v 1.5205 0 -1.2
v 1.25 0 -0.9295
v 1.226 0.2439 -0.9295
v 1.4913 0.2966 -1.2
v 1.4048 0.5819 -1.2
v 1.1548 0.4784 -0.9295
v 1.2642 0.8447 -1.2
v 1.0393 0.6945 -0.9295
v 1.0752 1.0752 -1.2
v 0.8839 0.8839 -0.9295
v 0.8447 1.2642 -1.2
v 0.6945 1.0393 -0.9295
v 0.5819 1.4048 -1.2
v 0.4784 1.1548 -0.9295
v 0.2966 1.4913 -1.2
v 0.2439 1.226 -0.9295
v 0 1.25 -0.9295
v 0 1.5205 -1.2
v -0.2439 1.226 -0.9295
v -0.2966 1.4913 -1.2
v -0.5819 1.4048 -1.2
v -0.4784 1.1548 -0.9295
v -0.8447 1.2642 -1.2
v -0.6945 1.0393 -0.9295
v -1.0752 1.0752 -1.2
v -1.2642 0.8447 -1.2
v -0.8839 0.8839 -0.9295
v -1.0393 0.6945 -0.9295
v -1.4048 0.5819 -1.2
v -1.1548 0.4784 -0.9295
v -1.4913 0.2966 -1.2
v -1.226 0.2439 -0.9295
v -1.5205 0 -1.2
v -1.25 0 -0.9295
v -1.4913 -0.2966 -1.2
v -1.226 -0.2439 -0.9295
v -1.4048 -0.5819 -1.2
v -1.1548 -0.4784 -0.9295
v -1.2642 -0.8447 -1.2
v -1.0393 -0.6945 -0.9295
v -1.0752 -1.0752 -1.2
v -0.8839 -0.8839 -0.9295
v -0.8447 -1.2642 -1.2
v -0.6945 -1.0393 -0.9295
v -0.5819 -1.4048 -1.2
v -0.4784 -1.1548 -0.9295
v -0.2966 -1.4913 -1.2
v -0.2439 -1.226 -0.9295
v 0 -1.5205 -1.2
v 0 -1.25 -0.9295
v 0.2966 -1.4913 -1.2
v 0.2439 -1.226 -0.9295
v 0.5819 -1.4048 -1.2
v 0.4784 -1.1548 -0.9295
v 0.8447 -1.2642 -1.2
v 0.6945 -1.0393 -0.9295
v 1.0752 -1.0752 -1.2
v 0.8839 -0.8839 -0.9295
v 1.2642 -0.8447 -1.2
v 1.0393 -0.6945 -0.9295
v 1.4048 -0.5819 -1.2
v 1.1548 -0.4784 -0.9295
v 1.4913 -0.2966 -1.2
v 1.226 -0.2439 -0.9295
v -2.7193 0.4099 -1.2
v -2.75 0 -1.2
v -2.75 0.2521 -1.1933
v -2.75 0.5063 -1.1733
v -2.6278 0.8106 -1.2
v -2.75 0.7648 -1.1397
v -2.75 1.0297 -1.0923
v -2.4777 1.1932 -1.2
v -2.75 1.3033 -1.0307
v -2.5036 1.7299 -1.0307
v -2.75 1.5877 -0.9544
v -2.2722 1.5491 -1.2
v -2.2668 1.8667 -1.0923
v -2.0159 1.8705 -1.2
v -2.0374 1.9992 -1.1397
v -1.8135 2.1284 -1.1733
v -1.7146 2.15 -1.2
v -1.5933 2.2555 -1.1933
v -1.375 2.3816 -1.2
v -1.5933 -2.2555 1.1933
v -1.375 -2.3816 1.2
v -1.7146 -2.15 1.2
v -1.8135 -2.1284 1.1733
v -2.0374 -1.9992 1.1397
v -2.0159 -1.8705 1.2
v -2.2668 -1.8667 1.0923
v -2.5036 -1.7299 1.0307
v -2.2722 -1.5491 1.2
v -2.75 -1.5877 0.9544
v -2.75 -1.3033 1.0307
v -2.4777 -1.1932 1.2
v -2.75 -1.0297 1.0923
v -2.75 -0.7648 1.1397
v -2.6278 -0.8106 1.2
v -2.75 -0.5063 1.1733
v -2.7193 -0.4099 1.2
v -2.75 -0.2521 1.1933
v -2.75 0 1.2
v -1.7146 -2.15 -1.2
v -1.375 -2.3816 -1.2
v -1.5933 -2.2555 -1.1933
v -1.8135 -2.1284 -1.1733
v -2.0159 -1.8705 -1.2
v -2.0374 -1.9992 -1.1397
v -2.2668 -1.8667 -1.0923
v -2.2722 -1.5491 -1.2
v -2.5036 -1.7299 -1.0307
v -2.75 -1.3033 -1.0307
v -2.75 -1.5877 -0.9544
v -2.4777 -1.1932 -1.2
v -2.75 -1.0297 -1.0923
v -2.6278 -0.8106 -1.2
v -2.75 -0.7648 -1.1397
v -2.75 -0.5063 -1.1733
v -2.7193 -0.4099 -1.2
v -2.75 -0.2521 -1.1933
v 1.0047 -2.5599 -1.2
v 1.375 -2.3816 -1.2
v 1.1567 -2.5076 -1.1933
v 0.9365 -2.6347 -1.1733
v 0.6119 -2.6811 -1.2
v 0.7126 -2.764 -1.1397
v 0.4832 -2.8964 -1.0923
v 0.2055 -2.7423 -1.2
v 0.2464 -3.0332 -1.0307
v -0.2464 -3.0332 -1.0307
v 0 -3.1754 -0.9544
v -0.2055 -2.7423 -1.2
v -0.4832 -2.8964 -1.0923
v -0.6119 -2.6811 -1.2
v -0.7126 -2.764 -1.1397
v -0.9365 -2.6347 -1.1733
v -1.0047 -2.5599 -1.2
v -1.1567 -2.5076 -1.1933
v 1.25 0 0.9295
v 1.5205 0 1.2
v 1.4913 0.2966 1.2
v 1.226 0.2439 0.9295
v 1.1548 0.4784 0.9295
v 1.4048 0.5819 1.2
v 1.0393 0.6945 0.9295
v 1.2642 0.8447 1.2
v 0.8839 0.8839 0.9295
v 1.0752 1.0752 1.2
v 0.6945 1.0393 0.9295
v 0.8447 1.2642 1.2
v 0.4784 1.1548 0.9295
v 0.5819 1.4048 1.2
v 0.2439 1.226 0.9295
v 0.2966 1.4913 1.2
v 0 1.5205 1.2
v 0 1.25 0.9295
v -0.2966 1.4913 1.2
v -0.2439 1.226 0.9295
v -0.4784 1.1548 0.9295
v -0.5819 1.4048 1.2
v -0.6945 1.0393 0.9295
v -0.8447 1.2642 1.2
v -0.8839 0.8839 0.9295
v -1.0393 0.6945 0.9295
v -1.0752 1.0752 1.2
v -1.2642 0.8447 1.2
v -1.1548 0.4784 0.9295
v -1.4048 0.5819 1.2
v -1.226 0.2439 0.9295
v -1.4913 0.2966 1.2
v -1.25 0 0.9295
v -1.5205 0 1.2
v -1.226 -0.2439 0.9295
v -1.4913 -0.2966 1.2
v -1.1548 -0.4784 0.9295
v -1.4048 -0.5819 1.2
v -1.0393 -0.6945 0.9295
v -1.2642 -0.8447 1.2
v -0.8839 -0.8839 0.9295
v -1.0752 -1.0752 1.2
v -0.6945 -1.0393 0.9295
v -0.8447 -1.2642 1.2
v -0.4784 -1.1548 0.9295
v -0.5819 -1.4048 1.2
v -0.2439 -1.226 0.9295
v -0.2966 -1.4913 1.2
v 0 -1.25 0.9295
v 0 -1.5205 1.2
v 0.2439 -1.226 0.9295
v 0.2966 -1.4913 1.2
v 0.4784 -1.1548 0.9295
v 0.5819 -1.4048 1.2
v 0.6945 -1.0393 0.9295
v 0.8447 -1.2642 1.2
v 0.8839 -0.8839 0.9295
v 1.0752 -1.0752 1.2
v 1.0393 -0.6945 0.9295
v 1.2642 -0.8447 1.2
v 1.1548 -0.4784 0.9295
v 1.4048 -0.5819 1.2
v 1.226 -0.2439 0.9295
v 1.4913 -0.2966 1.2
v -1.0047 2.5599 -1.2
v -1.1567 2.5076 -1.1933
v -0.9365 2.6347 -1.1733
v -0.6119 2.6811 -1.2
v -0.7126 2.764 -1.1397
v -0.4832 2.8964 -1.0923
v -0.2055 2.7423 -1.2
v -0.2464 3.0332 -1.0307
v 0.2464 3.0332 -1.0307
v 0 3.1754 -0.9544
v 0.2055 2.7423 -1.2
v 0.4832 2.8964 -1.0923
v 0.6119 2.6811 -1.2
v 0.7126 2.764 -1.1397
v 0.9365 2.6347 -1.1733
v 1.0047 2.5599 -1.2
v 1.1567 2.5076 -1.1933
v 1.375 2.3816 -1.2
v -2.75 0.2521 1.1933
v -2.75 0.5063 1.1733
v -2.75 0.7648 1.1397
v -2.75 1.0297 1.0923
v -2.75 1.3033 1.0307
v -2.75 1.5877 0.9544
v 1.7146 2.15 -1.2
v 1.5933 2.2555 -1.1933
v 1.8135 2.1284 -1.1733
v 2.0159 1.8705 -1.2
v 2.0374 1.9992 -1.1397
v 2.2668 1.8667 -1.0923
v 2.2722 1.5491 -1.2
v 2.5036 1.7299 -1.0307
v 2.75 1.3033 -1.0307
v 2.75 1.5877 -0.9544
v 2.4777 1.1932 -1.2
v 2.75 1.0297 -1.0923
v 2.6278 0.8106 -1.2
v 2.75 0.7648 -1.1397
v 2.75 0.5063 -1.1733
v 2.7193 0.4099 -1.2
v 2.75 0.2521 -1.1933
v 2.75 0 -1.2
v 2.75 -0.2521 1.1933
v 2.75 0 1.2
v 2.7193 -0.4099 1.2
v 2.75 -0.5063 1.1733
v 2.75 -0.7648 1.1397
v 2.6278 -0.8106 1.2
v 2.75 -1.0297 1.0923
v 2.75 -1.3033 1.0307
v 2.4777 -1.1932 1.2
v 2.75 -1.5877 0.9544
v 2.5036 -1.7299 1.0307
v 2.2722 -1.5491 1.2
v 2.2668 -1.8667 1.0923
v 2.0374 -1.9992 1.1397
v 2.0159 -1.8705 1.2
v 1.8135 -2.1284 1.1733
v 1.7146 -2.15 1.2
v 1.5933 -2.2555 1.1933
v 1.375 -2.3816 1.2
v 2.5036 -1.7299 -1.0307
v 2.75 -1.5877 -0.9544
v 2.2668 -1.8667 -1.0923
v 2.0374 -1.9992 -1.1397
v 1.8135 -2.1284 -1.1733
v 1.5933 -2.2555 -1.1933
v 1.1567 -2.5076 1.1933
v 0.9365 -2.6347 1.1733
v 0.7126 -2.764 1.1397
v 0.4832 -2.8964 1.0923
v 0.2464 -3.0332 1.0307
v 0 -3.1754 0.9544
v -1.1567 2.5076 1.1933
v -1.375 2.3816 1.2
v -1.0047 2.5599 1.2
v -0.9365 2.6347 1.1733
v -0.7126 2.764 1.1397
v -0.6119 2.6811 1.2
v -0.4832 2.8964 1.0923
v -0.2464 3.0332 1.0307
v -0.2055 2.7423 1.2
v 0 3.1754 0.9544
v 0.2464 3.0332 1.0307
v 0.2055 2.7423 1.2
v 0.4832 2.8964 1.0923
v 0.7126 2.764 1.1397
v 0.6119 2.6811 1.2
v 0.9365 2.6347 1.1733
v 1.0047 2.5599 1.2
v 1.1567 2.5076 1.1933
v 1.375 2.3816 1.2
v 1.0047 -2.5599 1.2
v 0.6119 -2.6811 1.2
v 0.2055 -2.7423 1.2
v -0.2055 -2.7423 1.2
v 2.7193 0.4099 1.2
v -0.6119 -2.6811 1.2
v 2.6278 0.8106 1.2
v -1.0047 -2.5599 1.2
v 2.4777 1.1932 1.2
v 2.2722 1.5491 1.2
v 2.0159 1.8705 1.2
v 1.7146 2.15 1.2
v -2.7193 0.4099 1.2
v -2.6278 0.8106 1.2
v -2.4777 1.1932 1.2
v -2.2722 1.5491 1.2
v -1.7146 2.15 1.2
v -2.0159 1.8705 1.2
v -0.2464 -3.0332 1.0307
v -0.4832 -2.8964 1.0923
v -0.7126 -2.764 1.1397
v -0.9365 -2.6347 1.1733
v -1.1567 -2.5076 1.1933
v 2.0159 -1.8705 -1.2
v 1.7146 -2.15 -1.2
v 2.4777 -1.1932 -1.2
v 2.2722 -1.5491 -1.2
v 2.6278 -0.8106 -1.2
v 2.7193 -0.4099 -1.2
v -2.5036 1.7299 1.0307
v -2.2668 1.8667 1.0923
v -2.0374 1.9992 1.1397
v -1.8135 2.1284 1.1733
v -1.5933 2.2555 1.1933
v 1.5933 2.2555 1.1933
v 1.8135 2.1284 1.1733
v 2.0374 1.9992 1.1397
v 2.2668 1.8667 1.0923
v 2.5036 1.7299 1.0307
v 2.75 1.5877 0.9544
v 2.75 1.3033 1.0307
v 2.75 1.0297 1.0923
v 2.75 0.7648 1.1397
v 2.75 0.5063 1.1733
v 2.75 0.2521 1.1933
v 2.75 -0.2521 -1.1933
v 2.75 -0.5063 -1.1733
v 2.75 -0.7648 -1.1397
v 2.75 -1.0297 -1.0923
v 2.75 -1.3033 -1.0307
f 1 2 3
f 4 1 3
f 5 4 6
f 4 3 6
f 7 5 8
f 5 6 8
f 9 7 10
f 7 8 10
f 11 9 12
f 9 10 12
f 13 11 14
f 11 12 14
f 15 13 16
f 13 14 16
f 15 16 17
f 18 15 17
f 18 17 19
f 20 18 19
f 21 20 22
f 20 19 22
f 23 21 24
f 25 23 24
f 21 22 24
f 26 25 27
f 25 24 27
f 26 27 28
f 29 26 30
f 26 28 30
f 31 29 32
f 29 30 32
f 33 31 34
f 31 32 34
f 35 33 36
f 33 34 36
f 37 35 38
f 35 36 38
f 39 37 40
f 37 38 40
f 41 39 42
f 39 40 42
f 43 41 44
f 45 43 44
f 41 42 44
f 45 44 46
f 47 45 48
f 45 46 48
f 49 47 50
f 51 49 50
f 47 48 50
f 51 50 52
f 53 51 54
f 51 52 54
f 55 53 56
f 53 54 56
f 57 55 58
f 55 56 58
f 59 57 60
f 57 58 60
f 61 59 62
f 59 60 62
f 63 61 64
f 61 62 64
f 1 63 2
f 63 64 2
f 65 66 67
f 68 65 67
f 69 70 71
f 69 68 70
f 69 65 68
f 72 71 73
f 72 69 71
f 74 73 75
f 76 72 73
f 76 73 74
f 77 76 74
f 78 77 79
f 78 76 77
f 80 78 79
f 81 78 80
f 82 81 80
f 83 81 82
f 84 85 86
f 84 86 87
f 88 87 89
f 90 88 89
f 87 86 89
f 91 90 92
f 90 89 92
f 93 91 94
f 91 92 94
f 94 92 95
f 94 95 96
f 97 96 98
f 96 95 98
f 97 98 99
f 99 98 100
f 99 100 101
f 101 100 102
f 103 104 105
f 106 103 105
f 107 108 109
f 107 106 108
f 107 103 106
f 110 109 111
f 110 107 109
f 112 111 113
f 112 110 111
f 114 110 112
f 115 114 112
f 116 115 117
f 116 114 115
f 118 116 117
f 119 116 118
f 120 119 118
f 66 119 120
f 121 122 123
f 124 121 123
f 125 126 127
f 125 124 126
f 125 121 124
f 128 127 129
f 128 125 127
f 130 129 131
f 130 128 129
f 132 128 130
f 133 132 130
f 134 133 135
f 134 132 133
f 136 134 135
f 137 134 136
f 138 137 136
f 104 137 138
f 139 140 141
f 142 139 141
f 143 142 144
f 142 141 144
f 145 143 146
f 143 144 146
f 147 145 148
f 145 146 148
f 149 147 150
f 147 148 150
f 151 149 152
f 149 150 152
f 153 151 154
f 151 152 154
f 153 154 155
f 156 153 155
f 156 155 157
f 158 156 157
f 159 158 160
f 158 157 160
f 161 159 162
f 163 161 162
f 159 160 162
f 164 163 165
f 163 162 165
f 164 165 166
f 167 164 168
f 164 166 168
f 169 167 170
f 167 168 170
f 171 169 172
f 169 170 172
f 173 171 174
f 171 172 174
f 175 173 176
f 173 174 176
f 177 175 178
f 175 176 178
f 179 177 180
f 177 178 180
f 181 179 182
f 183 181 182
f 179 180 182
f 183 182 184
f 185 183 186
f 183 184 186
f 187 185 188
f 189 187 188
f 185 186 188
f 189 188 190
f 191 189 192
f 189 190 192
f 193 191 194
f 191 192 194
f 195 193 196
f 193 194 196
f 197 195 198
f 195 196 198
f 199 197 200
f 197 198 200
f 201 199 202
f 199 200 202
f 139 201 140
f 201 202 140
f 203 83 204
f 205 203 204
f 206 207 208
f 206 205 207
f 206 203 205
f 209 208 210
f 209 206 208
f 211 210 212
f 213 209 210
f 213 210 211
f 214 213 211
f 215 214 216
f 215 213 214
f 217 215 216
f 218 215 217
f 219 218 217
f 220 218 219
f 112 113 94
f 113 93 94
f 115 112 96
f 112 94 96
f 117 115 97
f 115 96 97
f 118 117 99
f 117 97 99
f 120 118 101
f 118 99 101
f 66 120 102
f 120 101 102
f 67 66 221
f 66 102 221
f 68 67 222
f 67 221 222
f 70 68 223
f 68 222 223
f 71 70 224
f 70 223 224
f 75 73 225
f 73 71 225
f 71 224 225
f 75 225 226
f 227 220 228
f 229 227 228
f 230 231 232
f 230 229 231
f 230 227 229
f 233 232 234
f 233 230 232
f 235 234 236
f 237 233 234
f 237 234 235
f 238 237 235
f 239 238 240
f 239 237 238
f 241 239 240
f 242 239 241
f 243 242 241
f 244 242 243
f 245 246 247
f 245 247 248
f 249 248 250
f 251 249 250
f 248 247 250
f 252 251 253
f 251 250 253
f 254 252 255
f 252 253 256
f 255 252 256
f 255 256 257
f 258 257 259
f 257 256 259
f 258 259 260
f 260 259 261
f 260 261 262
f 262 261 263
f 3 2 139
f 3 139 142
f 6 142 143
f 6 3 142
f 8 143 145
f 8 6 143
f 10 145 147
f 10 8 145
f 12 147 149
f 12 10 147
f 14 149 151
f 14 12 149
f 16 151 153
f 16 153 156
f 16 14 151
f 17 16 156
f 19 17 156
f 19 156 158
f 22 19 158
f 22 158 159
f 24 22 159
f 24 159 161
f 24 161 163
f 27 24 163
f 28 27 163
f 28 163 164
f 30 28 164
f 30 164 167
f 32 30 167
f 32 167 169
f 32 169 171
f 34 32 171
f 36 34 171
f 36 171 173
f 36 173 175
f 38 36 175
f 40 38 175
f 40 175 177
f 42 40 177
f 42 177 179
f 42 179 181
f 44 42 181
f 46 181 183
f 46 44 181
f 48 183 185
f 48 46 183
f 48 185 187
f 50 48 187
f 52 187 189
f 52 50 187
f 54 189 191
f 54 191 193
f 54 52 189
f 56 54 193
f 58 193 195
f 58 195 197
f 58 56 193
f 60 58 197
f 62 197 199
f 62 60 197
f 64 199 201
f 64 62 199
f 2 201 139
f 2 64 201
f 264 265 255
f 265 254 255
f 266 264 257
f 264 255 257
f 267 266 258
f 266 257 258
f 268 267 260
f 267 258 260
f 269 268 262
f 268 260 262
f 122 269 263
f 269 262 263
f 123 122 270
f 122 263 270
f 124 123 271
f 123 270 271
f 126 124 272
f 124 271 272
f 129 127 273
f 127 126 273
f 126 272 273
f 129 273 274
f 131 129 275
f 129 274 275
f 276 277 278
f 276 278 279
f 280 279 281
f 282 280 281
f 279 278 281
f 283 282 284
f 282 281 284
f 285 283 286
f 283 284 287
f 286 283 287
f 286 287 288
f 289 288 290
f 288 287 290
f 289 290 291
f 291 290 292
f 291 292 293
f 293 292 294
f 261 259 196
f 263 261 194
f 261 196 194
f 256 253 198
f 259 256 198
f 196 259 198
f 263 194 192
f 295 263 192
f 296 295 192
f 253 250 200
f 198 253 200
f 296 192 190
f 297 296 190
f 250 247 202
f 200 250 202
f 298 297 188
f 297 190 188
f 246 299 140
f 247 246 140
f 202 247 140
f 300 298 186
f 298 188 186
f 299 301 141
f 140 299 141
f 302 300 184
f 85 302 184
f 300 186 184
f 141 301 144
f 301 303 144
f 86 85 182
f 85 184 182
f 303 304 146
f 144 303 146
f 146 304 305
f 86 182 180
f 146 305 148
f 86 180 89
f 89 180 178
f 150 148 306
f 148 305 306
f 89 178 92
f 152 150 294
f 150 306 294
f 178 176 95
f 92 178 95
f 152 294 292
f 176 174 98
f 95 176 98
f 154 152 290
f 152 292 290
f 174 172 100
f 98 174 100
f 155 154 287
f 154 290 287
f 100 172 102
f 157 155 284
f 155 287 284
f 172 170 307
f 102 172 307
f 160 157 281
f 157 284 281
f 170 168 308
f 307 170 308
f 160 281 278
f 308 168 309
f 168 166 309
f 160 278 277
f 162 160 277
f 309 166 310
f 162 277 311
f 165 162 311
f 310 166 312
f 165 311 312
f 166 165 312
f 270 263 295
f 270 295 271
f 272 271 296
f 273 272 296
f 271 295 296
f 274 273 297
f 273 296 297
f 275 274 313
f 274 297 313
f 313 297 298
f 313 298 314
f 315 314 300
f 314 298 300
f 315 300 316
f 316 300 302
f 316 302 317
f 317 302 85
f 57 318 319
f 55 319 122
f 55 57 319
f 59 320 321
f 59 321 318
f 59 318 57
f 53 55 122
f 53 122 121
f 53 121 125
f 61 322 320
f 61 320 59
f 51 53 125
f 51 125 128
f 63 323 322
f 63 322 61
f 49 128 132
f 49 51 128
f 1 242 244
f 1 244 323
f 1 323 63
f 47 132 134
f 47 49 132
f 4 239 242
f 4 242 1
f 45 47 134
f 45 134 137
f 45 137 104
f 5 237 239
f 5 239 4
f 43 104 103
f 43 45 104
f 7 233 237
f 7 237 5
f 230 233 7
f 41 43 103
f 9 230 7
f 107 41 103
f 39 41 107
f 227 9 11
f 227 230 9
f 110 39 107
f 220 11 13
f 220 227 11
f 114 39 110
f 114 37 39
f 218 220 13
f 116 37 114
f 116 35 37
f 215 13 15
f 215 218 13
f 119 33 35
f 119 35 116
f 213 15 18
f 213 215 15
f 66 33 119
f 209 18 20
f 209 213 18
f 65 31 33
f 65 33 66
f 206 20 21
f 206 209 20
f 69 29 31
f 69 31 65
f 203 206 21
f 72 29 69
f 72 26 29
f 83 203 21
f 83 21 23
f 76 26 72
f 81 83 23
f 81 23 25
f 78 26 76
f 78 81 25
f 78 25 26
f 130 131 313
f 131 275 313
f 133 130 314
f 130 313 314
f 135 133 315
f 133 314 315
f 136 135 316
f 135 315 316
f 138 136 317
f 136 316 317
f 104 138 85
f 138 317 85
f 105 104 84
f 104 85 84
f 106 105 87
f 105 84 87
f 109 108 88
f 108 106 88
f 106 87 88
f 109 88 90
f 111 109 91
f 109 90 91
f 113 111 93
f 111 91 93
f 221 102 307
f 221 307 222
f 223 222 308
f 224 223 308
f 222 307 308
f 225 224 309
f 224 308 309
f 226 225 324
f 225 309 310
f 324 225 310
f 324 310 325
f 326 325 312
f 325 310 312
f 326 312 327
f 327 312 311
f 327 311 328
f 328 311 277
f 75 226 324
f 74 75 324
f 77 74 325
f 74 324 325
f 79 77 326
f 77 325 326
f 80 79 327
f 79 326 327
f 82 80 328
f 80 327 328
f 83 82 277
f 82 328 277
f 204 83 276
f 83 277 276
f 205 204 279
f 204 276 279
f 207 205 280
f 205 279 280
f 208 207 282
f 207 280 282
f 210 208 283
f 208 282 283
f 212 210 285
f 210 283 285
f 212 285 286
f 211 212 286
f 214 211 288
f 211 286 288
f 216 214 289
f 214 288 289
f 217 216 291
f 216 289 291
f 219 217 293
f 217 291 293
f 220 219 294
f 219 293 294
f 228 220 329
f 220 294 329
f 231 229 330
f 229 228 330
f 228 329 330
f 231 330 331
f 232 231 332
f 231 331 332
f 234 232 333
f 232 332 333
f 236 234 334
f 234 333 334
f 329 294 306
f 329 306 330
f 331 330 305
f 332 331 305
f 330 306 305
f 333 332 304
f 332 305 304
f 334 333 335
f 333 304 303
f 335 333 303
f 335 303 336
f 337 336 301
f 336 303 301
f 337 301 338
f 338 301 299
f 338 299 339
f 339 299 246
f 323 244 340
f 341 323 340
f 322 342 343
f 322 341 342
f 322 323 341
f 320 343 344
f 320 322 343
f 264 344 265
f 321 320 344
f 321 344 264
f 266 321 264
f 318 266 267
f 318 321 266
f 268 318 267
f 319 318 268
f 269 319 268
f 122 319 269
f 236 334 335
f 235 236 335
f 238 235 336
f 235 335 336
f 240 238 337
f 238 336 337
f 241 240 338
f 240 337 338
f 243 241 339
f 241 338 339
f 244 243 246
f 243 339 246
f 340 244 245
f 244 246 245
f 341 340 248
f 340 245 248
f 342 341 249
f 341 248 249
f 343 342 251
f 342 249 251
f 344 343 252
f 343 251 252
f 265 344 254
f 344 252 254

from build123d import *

# Parameters (mm, degrees)
SKETCH2_R           = 1.25
BOSS_EXTRUDE1_DEPTH = 1.2
CHAMFER1_SIZE       = 0.2705


with BuildPart() as part:
    # Sketch2 → Boss-Extrude1 (new body, symmetric)
    with BuildSketch(Plane.XY):
        Polygon((2.75, 1.58771324), (2.75, -1.58771324), (0, -3.175426481), (-2.75, -1.58771324), (-2.75, 1.58771324), (0, 3.175426481), align=None)
        Circle(SKETCH2_R, mode=Mode.SUBTRACT)
    extrude(amount=BOSS_EXTRUDE1_DEPTH, both=True)

    # Sketch4 → Cut-Revolve2 (revolve, cut)
    with BuildSketch(Plane(origin=(0, 0, 0), x_dir=(0, 0, -1), z_dir=(1, 0, 0))):
        Polygon((1.2, 2.75), (1.2, 4.328660734), (0.2885598, 4.328660734), align=None)
    cut_revolve2 = revolve(axis=Axis((0, 0, 2.99453507), (0, 0, -1)), mode=Mode.SUBTRACT)

    # Mirror1: Cut-Revolve2 across plane
    add(cut_revolve2.mirror(Plane.XY), mode=Mode.SUBTRACT)

    # Chamfer1
    chamfer1_edges = [part.edges().sort_by_distance(p)[0] for p in [
        (-1.25, 0, -1.2),
        (-1.25, 0, 1.2),
    ]]
    chamfer(chamfer1_edges, length=CHAMFER1_SIZE)


solid = part.part
